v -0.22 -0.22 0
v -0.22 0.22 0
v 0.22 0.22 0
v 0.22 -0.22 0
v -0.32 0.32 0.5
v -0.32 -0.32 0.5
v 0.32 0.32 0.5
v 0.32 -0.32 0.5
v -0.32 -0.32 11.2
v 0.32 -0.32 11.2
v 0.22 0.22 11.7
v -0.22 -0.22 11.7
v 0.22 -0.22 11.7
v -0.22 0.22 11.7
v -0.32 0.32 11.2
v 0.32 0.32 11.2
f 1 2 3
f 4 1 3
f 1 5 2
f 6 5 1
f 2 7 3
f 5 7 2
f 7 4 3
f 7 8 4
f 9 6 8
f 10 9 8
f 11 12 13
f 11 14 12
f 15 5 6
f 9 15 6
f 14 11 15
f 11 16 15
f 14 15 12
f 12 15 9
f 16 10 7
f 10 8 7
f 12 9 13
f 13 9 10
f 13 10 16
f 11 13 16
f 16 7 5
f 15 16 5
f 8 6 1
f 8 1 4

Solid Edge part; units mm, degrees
sketch "Sketch1" plane through (0, 0, 0) normal (0, 0, 1) x (1, 0, 0)
  line L0 (-0.32, -0.32) -> (0.32, -0.32)
  line L1 (0.32, -0.32) -> (0.32, 0.32)
  line L2 (0.32, 0.32) -> (-0.32, 0.32)
  line L3 (-0.32, 0.32) -> (-0.32, -0.32)
extrude "Protrusion1" add sketch "Sketch1" along normal blind 11.7
chamfer "Chamfer" distance 0.1 distance2 0.5 8 edges at (-0.32, 0, 0) (0, 0.32, 0) (0.32, 0, 0) (0, -0.32, 0) (-0.32, 0, 11.7) (0, -0.32, 11.7) (0.32, 0, 11.7) (0, 0.32, 11.7) measured on face at (-0.2197, -0.2069, 11.7) measured on face at (-0.2197, -0.2069, 0)
